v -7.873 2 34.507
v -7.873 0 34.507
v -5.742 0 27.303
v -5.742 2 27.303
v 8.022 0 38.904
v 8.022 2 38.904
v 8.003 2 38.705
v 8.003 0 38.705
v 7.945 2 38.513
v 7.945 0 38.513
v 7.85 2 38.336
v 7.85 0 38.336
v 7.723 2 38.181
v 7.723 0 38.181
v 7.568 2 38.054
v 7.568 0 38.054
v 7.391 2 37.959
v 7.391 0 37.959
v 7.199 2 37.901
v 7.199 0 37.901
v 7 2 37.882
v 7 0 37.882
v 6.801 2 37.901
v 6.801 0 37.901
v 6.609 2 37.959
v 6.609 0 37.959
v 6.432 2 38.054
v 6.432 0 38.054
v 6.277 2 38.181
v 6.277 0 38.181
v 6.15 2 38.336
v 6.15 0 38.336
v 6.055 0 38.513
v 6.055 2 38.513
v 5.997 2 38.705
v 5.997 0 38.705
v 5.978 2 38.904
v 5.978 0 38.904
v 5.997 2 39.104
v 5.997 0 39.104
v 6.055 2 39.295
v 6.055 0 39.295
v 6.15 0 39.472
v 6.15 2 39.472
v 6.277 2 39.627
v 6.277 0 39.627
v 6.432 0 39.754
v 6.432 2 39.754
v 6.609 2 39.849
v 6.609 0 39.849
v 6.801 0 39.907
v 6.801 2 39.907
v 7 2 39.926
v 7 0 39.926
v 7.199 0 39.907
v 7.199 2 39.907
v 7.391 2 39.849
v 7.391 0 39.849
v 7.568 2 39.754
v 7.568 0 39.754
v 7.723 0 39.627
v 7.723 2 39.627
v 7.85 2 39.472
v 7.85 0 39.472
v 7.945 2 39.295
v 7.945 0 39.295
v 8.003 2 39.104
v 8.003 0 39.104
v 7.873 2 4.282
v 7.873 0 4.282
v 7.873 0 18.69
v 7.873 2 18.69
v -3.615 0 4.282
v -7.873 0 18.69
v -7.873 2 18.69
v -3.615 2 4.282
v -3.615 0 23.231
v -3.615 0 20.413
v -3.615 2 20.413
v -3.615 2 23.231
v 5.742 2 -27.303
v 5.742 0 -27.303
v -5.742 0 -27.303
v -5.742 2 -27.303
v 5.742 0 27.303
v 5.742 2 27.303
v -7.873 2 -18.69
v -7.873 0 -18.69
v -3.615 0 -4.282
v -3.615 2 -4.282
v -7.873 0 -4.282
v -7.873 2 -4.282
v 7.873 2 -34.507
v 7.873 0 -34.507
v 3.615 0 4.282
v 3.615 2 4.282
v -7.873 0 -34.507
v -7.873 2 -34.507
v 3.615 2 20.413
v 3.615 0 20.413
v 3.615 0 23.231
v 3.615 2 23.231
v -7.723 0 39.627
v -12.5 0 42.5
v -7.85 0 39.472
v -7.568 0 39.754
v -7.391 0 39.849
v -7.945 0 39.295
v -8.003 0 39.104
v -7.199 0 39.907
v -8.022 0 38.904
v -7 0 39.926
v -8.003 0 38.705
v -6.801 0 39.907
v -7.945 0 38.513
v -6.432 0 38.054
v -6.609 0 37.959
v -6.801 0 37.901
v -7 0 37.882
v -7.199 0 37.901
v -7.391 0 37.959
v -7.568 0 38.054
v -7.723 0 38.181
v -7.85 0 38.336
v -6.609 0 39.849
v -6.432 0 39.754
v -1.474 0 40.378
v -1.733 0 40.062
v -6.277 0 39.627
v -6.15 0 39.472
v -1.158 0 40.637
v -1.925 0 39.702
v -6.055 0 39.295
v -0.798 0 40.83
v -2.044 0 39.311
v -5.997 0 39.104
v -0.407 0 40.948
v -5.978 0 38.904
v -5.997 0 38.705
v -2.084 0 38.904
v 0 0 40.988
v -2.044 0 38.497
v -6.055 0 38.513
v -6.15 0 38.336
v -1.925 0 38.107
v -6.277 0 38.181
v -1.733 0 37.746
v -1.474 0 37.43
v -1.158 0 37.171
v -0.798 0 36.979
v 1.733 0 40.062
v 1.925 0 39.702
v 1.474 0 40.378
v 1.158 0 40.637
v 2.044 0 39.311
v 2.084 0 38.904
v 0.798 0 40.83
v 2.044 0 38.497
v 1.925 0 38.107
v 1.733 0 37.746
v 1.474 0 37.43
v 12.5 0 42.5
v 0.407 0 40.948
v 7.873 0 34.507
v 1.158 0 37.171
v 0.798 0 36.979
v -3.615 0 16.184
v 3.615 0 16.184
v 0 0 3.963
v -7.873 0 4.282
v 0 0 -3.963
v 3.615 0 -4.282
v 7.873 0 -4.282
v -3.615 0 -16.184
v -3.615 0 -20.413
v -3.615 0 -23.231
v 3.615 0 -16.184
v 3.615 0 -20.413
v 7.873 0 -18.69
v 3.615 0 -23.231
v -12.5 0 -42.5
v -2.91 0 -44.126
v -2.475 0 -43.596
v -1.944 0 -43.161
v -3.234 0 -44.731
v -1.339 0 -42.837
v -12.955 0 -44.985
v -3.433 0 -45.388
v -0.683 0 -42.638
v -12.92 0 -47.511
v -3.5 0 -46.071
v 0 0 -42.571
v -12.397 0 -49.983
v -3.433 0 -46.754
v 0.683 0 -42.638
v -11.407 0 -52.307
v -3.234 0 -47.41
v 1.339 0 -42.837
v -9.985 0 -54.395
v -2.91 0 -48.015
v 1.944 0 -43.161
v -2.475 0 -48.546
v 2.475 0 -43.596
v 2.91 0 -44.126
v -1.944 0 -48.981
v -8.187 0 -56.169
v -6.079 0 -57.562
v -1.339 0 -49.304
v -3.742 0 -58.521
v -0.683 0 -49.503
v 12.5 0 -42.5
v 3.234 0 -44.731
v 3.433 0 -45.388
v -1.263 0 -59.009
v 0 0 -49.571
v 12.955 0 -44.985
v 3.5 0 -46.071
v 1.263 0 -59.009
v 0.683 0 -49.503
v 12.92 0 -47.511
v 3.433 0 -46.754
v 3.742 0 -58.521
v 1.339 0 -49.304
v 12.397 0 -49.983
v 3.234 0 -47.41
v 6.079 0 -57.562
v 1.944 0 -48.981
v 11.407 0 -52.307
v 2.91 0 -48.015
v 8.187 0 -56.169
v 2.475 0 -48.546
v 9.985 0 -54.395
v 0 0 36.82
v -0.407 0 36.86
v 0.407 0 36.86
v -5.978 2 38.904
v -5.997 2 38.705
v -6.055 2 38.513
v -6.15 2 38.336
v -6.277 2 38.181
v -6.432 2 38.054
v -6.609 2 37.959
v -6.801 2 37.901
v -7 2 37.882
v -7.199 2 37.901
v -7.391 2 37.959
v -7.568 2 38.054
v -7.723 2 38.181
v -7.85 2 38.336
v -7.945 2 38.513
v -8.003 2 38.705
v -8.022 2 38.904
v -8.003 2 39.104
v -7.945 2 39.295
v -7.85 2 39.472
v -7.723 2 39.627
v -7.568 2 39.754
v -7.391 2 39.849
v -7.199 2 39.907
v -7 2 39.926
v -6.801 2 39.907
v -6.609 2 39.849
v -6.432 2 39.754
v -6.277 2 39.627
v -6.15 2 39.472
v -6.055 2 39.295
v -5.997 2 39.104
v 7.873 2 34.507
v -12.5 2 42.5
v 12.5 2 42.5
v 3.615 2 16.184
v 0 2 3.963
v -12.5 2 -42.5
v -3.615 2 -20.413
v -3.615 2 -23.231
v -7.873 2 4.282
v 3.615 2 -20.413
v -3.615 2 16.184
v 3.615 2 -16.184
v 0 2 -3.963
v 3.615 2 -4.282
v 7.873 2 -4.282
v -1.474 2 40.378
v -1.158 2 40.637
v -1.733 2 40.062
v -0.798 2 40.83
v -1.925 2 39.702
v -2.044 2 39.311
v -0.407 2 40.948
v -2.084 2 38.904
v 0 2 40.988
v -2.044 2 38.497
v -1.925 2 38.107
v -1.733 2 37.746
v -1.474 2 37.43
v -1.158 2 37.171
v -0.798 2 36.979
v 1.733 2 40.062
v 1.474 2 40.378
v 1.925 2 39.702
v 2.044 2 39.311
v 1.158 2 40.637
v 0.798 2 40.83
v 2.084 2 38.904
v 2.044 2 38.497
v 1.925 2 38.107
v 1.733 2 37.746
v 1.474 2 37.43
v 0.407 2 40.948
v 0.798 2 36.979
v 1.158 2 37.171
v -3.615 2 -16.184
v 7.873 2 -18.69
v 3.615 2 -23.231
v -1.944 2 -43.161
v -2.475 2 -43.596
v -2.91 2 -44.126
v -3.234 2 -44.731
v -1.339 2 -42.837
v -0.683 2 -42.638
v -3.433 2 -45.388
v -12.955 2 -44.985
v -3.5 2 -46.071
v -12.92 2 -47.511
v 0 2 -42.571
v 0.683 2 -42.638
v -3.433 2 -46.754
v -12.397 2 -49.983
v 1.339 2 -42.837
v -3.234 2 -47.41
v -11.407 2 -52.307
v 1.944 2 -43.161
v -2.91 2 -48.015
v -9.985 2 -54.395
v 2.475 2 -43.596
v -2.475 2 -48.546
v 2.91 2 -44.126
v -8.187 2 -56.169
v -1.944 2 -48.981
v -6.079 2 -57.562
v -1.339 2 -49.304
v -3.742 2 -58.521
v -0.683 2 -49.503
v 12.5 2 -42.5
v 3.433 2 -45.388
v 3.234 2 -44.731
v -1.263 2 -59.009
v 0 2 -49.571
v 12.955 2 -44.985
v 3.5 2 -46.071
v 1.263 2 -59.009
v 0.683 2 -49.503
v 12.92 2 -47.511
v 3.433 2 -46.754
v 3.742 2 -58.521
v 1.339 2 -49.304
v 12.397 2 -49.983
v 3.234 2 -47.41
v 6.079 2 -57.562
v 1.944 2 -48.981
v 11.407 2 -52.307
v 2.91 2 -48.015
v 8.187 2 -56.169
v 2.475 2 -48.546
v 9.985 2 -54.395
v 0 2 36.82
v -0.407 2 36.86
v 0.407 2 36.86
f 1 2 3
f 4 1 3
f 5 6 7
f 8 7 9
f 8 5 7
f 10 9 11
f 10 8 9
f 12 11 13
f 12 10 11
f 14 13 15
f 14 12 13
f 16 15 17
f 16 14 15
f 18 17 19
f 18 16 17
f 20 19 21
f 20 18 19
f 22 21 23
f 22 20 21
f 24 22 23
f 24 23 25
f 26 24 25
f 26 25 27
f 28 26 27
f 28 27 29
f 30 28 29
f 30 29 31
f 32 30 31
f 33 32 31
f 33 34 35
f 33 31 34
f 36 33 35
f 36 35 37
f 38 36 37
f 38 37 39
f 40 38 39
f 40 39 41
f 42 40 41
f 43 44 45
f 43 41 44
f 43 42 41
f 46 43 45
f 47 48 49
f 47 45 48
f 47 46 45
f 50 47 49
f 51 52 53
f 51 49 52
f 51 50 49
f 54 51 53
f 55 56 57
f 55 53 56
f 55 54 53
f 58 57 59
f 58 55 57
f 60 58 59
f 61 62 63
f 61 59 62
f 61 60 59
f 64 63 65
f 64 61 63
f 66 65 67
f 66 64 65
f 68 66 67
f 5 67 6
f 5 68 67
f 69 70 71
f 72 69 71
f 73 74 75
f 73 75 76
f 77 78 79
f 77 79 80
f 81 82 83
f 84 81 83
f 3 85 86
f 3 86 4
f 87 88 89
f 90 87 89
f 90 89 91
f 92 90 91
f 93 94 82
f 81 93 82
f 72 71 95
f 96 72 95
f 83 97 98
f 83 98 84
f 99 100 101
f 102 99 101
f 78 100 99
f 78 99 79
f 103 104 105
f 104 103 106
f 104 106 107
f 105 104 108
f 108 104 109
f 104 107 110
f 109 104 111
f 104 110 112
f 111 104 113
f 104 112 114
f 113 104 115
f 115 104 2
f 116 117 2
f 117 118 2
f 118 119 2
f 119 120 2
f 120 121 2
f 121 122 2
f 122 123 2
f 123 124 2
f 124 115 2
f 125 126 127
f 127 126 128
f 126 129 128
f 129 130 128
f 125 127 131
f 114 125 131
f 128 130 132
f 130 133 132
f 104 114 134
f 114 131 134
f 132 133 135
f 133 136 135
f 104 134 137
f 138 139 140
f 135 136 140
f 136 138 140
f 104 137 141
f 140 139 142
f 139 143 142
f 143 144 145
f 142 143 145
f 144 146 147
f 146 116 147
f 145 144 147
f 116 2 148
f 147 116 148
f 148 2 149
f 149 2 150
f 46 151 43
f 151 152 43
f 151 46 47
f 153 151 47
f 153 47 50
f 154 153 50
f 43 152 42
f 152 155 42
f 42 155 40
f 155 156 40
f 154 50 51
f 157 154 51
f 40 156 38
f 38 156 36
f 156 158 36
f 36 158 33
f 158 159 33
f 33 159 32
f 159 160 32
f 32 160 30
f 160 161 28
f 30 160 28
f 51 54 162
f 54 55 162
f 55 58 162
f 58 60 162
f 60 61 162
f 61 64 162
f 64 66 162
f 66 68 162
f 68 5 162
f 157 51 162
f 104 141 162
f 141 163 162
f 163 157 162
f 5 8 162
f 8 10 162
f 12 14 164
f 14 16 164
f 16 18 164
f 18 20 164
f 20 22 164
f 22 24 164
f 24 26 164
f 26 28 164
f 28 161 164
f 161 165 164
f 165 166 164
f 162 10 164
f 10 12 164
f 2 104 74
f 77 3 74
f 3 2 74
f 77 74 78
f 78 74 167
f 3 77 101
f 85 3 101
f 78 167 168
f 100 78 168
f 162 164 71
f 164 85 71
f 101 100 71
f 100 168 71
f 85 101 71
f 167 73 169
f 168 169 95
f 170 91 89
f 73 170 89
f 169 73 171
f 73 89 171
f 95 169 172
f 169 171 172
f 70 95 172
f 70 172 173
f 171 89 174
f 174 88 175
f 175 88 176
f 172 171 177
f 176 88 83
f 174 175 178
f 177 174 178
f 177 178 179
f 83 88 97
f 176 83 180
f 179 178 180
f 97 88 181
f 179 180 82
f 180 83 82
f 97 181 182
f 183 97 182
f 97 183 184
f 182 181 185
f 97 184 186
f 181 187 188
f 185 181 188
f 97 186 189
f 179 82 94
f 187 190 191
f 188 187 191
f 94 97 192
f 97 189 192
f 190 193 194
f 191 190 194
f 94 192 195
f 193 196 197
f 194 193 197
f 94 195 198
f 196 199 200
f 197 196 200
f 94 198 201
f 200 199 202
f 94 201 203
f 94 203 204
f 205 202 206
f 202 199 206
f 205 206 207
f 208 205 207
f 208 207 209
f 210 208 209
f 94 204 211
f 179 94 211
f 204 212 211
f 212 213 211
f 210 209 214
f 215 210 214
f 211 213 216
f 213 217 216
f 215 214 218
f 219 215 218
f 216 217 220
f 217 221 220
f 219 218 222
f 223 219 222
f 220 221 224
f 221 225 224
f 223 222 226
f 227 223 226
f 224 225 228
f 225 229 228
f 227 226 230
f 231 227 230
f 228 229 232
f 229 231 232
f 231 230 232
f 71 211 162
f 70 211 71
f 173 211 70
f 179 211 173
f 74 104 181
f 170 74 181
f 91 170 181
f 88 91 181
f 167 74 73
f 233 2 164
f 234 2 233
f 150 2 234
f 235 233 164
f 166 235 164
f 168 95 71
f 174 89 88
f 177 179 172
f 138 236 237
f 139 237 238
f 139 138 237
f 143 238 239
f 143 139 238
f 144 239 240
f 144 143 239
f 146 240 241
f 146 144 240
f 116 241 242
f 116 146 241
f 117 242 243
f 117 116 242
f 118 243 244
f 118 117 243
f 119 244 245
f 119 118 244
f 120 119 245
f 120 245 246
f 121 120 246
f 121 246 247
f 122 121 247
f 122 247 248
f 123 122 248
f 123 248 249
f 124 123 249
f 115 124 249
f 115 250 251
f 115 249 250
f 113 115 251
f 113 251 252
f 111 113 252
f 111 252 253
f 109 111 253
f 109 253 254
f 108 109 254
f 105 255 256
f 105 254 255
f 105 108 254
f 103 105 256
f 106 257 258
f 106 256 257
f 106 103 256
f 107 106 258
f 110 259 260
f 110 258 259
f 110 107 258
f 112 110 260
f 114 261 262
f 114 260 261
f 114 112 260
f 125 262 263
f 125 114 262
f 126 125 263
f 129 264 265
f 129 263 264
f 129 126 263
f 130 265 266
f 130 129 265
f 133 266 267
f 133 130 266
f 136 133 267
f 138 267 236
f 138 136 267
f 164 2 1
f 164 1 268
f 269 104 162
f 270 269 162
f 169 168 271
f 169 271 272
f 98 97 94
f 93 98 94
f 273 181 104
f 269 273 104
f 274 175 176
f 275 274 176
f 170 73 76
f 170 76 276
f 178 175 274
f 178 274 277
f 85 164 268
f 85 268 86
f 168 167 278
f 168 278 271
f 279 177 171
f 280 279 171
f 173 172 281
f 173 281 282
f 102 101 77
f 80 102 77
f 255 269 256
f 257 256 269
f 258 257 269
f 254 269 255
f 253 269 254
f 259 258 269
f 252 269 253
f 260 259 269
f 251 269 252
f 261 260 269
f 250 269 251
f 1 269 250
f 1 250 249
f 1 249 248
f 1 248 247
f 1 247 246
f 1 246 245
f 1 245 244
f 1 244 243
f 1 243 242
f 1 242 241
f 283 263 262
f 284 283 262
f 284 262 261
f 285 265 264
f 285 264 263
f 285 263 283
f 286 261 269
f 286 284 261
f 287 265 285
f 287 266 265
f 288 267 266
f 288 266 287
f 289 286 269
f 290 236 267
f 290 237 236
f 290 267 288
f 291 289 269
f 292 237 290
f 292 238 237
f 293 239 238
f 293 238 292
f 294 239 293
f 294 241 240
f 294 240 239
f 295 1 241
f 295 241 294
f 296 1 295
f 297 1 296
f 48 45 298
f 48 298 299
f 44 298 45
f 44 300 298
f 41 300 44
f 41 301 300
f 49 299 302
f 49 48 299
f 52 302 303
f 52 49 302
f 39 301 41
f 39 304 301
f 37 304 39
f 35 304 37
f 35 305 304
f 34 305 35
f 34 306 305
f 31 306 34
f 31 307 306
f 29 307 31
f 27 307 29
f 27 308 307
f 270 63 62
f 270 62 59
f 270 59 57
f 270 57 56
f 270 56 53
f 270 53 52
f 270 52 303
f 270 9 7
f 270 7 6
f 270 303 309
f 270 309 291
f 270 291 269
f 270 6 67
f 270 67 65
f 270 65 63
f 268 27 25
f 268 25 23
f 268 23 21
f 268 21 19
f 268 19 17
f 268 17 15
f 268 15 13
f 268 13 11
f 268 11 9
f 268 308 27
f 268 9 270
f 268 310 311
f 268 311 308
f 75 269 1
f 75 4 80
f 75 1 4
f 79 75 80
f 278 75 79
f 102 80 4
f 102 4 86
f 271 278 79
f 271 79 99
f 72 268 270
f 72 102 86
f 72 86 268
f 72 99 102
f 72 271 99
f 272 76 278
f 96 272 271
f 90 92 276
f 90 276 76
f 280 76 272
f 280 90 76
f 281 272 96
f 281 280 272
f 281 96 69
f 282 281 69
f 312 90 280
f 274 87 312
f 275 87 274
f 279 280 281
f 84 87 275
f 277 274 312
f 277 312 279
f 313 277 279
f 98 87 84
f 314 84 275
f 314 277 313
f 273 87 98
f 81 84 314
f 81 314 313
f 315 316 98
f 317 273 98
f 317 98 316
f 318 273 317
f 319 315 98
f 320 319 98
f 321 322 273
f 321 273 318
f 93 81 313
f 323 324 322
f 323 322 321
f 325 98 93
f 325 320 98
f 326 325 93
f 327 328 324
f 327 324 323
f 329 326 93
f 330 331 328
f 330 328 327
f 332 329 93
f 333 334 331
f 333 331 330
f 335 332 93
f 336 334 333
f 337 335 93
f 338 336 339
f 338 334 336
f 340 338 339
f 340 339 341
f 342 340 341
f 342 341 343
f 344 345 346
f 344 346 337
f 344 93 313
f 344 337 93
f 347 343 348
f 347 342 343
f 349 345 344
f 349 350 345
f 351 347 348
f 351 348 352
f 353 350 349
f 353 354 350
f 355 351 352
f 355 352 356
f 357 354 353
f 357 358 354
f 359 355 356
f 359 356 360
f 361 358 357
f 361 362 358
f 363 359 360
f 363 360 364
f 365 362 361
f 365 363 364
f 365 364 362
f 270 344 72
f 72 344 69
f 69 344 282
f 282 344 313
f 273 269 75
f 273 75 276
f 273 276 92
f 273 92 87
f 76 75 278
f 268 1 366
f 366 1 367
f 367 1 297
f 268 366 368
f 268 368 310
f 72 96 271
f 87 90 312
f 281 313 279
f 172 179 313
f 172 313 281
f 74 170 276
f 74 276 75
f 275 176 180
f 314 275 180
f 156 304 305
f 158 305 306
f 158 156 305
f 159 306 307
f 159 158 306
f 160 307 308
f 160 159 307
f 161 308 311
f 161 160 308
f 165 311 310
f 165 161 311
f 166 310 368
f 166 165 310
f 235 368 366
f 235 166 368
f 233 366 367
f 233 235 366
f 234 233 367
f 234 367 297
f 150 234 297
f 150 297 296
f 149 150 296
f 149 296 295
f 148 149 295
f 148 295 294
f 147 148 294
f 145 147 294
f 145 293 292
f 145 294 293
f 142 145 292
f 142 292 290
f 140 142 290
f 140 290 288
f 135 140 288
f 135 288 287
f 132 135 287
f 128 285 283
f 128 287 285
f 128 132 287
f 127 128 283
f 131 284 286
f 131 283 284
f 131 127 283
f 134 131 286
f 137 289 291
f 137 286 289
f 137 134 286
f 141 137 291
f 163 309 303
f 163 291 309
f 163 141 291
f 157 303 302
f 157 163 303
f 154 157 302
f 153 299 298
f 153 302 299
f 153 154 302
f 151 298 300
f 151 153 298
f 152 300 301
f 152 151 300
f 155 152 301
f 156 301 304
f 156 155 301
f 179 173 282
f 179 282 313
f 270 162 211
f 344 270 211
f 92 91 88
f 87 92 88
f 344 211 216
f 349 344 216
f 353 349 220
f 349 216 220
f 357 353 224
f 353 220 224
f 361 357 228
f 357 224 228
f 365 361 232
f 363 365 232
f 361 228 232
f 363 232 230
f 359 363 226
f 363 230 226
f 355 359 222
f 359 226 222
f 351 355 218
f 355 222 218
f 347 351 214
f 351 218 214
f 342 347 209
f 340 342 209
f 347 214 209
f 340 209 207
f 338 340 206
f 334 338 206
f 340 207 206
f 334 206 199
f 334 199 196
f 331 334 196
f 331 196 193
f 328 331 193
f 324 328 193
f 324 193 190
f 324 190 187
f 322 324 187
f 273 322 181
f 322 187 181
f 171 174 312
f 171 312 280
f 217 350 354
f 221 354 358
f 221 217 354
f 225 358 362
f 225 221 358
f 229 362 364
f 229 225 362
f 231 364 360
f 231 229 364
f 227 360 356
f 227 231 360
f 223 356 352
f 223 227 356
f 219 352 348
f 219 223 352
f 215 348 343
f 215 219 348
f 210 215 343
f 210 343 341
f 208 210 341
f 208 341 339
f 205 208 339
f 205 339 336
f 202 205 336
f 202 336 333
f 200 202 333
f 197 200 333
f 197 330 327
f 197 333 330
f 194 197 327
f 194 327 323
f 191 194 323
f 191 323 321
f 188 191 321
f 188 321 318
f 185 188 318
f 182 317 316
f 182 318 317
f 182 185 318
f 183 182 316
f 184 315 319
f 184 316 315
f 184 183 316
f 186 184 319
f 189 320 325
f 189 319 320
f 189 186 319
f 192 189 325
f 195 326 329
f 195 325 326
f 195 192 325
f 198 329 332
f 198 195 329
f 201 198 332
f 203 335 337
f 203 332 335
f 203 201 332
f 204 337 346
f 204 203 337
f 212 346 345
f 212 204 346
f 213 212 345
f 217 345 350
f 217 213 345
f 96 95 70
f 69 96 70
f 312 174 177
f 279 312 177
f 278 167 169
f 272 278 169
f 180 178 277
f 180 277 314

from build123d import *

# Parameters (mm, degrees)
BOSS_EXTRUDE1_DEPTH     = 2
SKETCH5_W               = 3.614771896
SKETCH5_H               = 2.818898279
CUT_EXTRUDE4_DEPTH      = 2
MIRROR3_COPY_1_SKETCH_W = 3.614771896
MIRROR3_COPY_1_SKETCH_H = 2.818898279
MIRROR3_COPY_1_DEPTH    = 2
SKETCH6_R               = 3.5
CUT_EXTRUDE5_DEPTH      = 3
CUT_EXTRUDE5_DEPTH_BACK = 1
CUT_EXTRUDE7_REACH      = 4
SKETCH8_R               = 2.084098117
SKETCH8_R_2             = 1.022428323


with BuildPart() as part:
    # Sketch2 → Boss-Extrude1 (new body)
    with BuildSketch(Plane(origin=(0, 0, 0), x_dir=(1, 0, 0), z_dir=(0, 1, 0))):
        with BuildLine():
            Line((-12.5, -42.5), (12.5, -42.5))
            Line((12.5, -42.5), (12.5, 42.5))
            ThreePointArc((12.5, 42.5), (0, 59.070714214), (-12.5, 42.5))
            Line((-12.5, 42.5), (-12.5, -42.5))
        make_face()
    extrude(amount=BOSS_EXTRUDE1_DEPTH)

    # Sketch5 → Cut-Extrude4 (cut)
    with BuildSketch(Plane(origin=(0, 0, 0), x_dir=(1, 0, 0), z_dir=(0, 1, 0))):
        Polygon((0, 34.507006909), (7.873050165, 34.507006909), (5.742382303, 27.303155751), (0, 27.303155751), align=None)
        with Locations((1.807385948, 21.821964654)):
            Rectangle(SKETCH5_W, SKETCH5_H)
        Polygon((0, 16.184168096), (3.614771896, 16.184168096), (0, 3.962517237), align=None)
        Polygon((7.873050165, 18.689855455), (3.614771896, 4.28215314), (7.873050165, 4.28215314), align=None)
    cut_extrude4 = extrude(amount=CUT_EXTRUDE4_DEPTH, mode=Mode.SUBTRACT)

    # Mirror1: Cut-Extrude4 across plane
    add(cut_extrude4.mirror(Plane(origin=(0, 0, 0), x_dir=(0, 0, 1), z_dir=(1, 0, 0))), mode=Mode.SUBTRACT)

    # Mirror3: Cut-Extrude4 across plane
    add(cut_extrude4.mirror(Plane.XY), mode=Mode.SUBTRACT)

    # Mirror3 copy 1 sketch → Mirror3 copy 1 (cut)
    with BuildSketch(Plane(origin=(0, 0, 0), x_dir=(-1, 0, 0), z_dir=(0, 1, 0))):
        Polygon((0, 34.507006909), (7.873050165, 34.507006909), (5.742382303, 27.303155751), (0, 27.303155751), align=None)
        with Locations((1.807385948, 21.821964654)):
            Rectangle(MIRROR3_COPY_1_SKETCH_W, MIRROR3_COPY_1_SKETCH_H)
        Polygon((0, 16.184168096), (3.614771896, 16.184168096), (0, 3.962517237), align=None)
        Polygon((7.873050165, 18.689855455), (3.614771896, 4.28215314), (7.873050165, 4.28215314), align=None)
    extrude(amount=MIRROR3_COPY_1_DEPTH, mode=Mode.SUBTRACT)

    # Sketch6 → Cut-Extrude5 (cut, two sides)
    with BuildSketch(Plane(origin=(0, 0, 0), x_dir=(1, 0, 0), z_dir=(0, 1, 0))) as cut_extrude5_sk:
        with Locations((0, 46.070714214)):
            Circle(SKETCH6_R)
    extrude(amount=CUT_EXTRUDE5_DEPTH, mode=Mode.SUBTRACT)
    extrude(cut_extrude5_sk.sketch, amount=-CUT_EXTRUDE5_DEPTH_BACK, mode=Mode.SUBTRACT)

    # Sketch8 → Cut-Extrude7 (cut, up to next)
    with BuildSketch(Plane(origin=(0, 0, 0), x_dir=(1, 0, 0), z_dir=(0, 1, 0)), mode=Mode.PRIVATE) as cut_extrude7_sk1:
        with Locations((0, -38.904058143)):
            Circle(SKETCH8_R)
    cut_extrude7_tool1 = extrude(cut_extrude7_sk1.sketch, amount=CUT_EXTRUDE7_REACH, mode=Mode.PRIVATE) & part.part
    add(cut_extrude7_tool1.solids().sort_by_distance((0, 0, 38.904058))[0], mode=Mode.SUBTRACT)
    # Sketch8 → Cut-Extrude7 (cut, up to next)
    with BuildSketch(Plane(origin=(0, 0, 0), x_dir=(1, 0, 0), z_dir=(0, 1, 0)), mode=Mode.PRIVATE) as cut_extrude7_sk2:
        with Locations((7, -38.904058143)):
            Circle(SKETCH8_R_2)
    cut_extrude7_tool2 = extrude(cut_extrude7_sk2.sketch, amount=CUT_EXTRUDE7_REACH, mode=Mode.PRIVATE) & part.part
    add(cut_extrude7_tool2.solids().sort_by_distance((7, 0, 38.904058))[0], mode=Mode.SUBTRACT)
    # Sketch8 → Cut-Extrude7 (cut, up to next)
    with BuildSketch(Plane(origin=(0, 0, 0), x_dir=(1, 0, 0), z_dir=(0, 1, 0)), mode=Mode.PRIVATE) as cut_extrude7_sk3:
        with Locations((-7, -38.904058143)):
            Circle(SKETCH8_R_2)
    cut_extrude7_tool3 = extrude(cut_extrude7_sk3.sketch, amount=CUT_EXTRUDE7_REACH, mode=Mode.PRIVATE) & part.part
    add(cut_extrude7_tool3.solids().sort_by_distance((-7, 0, 38.904058))[0], mode=Mode.SUBTRACT)


solid = part.part
